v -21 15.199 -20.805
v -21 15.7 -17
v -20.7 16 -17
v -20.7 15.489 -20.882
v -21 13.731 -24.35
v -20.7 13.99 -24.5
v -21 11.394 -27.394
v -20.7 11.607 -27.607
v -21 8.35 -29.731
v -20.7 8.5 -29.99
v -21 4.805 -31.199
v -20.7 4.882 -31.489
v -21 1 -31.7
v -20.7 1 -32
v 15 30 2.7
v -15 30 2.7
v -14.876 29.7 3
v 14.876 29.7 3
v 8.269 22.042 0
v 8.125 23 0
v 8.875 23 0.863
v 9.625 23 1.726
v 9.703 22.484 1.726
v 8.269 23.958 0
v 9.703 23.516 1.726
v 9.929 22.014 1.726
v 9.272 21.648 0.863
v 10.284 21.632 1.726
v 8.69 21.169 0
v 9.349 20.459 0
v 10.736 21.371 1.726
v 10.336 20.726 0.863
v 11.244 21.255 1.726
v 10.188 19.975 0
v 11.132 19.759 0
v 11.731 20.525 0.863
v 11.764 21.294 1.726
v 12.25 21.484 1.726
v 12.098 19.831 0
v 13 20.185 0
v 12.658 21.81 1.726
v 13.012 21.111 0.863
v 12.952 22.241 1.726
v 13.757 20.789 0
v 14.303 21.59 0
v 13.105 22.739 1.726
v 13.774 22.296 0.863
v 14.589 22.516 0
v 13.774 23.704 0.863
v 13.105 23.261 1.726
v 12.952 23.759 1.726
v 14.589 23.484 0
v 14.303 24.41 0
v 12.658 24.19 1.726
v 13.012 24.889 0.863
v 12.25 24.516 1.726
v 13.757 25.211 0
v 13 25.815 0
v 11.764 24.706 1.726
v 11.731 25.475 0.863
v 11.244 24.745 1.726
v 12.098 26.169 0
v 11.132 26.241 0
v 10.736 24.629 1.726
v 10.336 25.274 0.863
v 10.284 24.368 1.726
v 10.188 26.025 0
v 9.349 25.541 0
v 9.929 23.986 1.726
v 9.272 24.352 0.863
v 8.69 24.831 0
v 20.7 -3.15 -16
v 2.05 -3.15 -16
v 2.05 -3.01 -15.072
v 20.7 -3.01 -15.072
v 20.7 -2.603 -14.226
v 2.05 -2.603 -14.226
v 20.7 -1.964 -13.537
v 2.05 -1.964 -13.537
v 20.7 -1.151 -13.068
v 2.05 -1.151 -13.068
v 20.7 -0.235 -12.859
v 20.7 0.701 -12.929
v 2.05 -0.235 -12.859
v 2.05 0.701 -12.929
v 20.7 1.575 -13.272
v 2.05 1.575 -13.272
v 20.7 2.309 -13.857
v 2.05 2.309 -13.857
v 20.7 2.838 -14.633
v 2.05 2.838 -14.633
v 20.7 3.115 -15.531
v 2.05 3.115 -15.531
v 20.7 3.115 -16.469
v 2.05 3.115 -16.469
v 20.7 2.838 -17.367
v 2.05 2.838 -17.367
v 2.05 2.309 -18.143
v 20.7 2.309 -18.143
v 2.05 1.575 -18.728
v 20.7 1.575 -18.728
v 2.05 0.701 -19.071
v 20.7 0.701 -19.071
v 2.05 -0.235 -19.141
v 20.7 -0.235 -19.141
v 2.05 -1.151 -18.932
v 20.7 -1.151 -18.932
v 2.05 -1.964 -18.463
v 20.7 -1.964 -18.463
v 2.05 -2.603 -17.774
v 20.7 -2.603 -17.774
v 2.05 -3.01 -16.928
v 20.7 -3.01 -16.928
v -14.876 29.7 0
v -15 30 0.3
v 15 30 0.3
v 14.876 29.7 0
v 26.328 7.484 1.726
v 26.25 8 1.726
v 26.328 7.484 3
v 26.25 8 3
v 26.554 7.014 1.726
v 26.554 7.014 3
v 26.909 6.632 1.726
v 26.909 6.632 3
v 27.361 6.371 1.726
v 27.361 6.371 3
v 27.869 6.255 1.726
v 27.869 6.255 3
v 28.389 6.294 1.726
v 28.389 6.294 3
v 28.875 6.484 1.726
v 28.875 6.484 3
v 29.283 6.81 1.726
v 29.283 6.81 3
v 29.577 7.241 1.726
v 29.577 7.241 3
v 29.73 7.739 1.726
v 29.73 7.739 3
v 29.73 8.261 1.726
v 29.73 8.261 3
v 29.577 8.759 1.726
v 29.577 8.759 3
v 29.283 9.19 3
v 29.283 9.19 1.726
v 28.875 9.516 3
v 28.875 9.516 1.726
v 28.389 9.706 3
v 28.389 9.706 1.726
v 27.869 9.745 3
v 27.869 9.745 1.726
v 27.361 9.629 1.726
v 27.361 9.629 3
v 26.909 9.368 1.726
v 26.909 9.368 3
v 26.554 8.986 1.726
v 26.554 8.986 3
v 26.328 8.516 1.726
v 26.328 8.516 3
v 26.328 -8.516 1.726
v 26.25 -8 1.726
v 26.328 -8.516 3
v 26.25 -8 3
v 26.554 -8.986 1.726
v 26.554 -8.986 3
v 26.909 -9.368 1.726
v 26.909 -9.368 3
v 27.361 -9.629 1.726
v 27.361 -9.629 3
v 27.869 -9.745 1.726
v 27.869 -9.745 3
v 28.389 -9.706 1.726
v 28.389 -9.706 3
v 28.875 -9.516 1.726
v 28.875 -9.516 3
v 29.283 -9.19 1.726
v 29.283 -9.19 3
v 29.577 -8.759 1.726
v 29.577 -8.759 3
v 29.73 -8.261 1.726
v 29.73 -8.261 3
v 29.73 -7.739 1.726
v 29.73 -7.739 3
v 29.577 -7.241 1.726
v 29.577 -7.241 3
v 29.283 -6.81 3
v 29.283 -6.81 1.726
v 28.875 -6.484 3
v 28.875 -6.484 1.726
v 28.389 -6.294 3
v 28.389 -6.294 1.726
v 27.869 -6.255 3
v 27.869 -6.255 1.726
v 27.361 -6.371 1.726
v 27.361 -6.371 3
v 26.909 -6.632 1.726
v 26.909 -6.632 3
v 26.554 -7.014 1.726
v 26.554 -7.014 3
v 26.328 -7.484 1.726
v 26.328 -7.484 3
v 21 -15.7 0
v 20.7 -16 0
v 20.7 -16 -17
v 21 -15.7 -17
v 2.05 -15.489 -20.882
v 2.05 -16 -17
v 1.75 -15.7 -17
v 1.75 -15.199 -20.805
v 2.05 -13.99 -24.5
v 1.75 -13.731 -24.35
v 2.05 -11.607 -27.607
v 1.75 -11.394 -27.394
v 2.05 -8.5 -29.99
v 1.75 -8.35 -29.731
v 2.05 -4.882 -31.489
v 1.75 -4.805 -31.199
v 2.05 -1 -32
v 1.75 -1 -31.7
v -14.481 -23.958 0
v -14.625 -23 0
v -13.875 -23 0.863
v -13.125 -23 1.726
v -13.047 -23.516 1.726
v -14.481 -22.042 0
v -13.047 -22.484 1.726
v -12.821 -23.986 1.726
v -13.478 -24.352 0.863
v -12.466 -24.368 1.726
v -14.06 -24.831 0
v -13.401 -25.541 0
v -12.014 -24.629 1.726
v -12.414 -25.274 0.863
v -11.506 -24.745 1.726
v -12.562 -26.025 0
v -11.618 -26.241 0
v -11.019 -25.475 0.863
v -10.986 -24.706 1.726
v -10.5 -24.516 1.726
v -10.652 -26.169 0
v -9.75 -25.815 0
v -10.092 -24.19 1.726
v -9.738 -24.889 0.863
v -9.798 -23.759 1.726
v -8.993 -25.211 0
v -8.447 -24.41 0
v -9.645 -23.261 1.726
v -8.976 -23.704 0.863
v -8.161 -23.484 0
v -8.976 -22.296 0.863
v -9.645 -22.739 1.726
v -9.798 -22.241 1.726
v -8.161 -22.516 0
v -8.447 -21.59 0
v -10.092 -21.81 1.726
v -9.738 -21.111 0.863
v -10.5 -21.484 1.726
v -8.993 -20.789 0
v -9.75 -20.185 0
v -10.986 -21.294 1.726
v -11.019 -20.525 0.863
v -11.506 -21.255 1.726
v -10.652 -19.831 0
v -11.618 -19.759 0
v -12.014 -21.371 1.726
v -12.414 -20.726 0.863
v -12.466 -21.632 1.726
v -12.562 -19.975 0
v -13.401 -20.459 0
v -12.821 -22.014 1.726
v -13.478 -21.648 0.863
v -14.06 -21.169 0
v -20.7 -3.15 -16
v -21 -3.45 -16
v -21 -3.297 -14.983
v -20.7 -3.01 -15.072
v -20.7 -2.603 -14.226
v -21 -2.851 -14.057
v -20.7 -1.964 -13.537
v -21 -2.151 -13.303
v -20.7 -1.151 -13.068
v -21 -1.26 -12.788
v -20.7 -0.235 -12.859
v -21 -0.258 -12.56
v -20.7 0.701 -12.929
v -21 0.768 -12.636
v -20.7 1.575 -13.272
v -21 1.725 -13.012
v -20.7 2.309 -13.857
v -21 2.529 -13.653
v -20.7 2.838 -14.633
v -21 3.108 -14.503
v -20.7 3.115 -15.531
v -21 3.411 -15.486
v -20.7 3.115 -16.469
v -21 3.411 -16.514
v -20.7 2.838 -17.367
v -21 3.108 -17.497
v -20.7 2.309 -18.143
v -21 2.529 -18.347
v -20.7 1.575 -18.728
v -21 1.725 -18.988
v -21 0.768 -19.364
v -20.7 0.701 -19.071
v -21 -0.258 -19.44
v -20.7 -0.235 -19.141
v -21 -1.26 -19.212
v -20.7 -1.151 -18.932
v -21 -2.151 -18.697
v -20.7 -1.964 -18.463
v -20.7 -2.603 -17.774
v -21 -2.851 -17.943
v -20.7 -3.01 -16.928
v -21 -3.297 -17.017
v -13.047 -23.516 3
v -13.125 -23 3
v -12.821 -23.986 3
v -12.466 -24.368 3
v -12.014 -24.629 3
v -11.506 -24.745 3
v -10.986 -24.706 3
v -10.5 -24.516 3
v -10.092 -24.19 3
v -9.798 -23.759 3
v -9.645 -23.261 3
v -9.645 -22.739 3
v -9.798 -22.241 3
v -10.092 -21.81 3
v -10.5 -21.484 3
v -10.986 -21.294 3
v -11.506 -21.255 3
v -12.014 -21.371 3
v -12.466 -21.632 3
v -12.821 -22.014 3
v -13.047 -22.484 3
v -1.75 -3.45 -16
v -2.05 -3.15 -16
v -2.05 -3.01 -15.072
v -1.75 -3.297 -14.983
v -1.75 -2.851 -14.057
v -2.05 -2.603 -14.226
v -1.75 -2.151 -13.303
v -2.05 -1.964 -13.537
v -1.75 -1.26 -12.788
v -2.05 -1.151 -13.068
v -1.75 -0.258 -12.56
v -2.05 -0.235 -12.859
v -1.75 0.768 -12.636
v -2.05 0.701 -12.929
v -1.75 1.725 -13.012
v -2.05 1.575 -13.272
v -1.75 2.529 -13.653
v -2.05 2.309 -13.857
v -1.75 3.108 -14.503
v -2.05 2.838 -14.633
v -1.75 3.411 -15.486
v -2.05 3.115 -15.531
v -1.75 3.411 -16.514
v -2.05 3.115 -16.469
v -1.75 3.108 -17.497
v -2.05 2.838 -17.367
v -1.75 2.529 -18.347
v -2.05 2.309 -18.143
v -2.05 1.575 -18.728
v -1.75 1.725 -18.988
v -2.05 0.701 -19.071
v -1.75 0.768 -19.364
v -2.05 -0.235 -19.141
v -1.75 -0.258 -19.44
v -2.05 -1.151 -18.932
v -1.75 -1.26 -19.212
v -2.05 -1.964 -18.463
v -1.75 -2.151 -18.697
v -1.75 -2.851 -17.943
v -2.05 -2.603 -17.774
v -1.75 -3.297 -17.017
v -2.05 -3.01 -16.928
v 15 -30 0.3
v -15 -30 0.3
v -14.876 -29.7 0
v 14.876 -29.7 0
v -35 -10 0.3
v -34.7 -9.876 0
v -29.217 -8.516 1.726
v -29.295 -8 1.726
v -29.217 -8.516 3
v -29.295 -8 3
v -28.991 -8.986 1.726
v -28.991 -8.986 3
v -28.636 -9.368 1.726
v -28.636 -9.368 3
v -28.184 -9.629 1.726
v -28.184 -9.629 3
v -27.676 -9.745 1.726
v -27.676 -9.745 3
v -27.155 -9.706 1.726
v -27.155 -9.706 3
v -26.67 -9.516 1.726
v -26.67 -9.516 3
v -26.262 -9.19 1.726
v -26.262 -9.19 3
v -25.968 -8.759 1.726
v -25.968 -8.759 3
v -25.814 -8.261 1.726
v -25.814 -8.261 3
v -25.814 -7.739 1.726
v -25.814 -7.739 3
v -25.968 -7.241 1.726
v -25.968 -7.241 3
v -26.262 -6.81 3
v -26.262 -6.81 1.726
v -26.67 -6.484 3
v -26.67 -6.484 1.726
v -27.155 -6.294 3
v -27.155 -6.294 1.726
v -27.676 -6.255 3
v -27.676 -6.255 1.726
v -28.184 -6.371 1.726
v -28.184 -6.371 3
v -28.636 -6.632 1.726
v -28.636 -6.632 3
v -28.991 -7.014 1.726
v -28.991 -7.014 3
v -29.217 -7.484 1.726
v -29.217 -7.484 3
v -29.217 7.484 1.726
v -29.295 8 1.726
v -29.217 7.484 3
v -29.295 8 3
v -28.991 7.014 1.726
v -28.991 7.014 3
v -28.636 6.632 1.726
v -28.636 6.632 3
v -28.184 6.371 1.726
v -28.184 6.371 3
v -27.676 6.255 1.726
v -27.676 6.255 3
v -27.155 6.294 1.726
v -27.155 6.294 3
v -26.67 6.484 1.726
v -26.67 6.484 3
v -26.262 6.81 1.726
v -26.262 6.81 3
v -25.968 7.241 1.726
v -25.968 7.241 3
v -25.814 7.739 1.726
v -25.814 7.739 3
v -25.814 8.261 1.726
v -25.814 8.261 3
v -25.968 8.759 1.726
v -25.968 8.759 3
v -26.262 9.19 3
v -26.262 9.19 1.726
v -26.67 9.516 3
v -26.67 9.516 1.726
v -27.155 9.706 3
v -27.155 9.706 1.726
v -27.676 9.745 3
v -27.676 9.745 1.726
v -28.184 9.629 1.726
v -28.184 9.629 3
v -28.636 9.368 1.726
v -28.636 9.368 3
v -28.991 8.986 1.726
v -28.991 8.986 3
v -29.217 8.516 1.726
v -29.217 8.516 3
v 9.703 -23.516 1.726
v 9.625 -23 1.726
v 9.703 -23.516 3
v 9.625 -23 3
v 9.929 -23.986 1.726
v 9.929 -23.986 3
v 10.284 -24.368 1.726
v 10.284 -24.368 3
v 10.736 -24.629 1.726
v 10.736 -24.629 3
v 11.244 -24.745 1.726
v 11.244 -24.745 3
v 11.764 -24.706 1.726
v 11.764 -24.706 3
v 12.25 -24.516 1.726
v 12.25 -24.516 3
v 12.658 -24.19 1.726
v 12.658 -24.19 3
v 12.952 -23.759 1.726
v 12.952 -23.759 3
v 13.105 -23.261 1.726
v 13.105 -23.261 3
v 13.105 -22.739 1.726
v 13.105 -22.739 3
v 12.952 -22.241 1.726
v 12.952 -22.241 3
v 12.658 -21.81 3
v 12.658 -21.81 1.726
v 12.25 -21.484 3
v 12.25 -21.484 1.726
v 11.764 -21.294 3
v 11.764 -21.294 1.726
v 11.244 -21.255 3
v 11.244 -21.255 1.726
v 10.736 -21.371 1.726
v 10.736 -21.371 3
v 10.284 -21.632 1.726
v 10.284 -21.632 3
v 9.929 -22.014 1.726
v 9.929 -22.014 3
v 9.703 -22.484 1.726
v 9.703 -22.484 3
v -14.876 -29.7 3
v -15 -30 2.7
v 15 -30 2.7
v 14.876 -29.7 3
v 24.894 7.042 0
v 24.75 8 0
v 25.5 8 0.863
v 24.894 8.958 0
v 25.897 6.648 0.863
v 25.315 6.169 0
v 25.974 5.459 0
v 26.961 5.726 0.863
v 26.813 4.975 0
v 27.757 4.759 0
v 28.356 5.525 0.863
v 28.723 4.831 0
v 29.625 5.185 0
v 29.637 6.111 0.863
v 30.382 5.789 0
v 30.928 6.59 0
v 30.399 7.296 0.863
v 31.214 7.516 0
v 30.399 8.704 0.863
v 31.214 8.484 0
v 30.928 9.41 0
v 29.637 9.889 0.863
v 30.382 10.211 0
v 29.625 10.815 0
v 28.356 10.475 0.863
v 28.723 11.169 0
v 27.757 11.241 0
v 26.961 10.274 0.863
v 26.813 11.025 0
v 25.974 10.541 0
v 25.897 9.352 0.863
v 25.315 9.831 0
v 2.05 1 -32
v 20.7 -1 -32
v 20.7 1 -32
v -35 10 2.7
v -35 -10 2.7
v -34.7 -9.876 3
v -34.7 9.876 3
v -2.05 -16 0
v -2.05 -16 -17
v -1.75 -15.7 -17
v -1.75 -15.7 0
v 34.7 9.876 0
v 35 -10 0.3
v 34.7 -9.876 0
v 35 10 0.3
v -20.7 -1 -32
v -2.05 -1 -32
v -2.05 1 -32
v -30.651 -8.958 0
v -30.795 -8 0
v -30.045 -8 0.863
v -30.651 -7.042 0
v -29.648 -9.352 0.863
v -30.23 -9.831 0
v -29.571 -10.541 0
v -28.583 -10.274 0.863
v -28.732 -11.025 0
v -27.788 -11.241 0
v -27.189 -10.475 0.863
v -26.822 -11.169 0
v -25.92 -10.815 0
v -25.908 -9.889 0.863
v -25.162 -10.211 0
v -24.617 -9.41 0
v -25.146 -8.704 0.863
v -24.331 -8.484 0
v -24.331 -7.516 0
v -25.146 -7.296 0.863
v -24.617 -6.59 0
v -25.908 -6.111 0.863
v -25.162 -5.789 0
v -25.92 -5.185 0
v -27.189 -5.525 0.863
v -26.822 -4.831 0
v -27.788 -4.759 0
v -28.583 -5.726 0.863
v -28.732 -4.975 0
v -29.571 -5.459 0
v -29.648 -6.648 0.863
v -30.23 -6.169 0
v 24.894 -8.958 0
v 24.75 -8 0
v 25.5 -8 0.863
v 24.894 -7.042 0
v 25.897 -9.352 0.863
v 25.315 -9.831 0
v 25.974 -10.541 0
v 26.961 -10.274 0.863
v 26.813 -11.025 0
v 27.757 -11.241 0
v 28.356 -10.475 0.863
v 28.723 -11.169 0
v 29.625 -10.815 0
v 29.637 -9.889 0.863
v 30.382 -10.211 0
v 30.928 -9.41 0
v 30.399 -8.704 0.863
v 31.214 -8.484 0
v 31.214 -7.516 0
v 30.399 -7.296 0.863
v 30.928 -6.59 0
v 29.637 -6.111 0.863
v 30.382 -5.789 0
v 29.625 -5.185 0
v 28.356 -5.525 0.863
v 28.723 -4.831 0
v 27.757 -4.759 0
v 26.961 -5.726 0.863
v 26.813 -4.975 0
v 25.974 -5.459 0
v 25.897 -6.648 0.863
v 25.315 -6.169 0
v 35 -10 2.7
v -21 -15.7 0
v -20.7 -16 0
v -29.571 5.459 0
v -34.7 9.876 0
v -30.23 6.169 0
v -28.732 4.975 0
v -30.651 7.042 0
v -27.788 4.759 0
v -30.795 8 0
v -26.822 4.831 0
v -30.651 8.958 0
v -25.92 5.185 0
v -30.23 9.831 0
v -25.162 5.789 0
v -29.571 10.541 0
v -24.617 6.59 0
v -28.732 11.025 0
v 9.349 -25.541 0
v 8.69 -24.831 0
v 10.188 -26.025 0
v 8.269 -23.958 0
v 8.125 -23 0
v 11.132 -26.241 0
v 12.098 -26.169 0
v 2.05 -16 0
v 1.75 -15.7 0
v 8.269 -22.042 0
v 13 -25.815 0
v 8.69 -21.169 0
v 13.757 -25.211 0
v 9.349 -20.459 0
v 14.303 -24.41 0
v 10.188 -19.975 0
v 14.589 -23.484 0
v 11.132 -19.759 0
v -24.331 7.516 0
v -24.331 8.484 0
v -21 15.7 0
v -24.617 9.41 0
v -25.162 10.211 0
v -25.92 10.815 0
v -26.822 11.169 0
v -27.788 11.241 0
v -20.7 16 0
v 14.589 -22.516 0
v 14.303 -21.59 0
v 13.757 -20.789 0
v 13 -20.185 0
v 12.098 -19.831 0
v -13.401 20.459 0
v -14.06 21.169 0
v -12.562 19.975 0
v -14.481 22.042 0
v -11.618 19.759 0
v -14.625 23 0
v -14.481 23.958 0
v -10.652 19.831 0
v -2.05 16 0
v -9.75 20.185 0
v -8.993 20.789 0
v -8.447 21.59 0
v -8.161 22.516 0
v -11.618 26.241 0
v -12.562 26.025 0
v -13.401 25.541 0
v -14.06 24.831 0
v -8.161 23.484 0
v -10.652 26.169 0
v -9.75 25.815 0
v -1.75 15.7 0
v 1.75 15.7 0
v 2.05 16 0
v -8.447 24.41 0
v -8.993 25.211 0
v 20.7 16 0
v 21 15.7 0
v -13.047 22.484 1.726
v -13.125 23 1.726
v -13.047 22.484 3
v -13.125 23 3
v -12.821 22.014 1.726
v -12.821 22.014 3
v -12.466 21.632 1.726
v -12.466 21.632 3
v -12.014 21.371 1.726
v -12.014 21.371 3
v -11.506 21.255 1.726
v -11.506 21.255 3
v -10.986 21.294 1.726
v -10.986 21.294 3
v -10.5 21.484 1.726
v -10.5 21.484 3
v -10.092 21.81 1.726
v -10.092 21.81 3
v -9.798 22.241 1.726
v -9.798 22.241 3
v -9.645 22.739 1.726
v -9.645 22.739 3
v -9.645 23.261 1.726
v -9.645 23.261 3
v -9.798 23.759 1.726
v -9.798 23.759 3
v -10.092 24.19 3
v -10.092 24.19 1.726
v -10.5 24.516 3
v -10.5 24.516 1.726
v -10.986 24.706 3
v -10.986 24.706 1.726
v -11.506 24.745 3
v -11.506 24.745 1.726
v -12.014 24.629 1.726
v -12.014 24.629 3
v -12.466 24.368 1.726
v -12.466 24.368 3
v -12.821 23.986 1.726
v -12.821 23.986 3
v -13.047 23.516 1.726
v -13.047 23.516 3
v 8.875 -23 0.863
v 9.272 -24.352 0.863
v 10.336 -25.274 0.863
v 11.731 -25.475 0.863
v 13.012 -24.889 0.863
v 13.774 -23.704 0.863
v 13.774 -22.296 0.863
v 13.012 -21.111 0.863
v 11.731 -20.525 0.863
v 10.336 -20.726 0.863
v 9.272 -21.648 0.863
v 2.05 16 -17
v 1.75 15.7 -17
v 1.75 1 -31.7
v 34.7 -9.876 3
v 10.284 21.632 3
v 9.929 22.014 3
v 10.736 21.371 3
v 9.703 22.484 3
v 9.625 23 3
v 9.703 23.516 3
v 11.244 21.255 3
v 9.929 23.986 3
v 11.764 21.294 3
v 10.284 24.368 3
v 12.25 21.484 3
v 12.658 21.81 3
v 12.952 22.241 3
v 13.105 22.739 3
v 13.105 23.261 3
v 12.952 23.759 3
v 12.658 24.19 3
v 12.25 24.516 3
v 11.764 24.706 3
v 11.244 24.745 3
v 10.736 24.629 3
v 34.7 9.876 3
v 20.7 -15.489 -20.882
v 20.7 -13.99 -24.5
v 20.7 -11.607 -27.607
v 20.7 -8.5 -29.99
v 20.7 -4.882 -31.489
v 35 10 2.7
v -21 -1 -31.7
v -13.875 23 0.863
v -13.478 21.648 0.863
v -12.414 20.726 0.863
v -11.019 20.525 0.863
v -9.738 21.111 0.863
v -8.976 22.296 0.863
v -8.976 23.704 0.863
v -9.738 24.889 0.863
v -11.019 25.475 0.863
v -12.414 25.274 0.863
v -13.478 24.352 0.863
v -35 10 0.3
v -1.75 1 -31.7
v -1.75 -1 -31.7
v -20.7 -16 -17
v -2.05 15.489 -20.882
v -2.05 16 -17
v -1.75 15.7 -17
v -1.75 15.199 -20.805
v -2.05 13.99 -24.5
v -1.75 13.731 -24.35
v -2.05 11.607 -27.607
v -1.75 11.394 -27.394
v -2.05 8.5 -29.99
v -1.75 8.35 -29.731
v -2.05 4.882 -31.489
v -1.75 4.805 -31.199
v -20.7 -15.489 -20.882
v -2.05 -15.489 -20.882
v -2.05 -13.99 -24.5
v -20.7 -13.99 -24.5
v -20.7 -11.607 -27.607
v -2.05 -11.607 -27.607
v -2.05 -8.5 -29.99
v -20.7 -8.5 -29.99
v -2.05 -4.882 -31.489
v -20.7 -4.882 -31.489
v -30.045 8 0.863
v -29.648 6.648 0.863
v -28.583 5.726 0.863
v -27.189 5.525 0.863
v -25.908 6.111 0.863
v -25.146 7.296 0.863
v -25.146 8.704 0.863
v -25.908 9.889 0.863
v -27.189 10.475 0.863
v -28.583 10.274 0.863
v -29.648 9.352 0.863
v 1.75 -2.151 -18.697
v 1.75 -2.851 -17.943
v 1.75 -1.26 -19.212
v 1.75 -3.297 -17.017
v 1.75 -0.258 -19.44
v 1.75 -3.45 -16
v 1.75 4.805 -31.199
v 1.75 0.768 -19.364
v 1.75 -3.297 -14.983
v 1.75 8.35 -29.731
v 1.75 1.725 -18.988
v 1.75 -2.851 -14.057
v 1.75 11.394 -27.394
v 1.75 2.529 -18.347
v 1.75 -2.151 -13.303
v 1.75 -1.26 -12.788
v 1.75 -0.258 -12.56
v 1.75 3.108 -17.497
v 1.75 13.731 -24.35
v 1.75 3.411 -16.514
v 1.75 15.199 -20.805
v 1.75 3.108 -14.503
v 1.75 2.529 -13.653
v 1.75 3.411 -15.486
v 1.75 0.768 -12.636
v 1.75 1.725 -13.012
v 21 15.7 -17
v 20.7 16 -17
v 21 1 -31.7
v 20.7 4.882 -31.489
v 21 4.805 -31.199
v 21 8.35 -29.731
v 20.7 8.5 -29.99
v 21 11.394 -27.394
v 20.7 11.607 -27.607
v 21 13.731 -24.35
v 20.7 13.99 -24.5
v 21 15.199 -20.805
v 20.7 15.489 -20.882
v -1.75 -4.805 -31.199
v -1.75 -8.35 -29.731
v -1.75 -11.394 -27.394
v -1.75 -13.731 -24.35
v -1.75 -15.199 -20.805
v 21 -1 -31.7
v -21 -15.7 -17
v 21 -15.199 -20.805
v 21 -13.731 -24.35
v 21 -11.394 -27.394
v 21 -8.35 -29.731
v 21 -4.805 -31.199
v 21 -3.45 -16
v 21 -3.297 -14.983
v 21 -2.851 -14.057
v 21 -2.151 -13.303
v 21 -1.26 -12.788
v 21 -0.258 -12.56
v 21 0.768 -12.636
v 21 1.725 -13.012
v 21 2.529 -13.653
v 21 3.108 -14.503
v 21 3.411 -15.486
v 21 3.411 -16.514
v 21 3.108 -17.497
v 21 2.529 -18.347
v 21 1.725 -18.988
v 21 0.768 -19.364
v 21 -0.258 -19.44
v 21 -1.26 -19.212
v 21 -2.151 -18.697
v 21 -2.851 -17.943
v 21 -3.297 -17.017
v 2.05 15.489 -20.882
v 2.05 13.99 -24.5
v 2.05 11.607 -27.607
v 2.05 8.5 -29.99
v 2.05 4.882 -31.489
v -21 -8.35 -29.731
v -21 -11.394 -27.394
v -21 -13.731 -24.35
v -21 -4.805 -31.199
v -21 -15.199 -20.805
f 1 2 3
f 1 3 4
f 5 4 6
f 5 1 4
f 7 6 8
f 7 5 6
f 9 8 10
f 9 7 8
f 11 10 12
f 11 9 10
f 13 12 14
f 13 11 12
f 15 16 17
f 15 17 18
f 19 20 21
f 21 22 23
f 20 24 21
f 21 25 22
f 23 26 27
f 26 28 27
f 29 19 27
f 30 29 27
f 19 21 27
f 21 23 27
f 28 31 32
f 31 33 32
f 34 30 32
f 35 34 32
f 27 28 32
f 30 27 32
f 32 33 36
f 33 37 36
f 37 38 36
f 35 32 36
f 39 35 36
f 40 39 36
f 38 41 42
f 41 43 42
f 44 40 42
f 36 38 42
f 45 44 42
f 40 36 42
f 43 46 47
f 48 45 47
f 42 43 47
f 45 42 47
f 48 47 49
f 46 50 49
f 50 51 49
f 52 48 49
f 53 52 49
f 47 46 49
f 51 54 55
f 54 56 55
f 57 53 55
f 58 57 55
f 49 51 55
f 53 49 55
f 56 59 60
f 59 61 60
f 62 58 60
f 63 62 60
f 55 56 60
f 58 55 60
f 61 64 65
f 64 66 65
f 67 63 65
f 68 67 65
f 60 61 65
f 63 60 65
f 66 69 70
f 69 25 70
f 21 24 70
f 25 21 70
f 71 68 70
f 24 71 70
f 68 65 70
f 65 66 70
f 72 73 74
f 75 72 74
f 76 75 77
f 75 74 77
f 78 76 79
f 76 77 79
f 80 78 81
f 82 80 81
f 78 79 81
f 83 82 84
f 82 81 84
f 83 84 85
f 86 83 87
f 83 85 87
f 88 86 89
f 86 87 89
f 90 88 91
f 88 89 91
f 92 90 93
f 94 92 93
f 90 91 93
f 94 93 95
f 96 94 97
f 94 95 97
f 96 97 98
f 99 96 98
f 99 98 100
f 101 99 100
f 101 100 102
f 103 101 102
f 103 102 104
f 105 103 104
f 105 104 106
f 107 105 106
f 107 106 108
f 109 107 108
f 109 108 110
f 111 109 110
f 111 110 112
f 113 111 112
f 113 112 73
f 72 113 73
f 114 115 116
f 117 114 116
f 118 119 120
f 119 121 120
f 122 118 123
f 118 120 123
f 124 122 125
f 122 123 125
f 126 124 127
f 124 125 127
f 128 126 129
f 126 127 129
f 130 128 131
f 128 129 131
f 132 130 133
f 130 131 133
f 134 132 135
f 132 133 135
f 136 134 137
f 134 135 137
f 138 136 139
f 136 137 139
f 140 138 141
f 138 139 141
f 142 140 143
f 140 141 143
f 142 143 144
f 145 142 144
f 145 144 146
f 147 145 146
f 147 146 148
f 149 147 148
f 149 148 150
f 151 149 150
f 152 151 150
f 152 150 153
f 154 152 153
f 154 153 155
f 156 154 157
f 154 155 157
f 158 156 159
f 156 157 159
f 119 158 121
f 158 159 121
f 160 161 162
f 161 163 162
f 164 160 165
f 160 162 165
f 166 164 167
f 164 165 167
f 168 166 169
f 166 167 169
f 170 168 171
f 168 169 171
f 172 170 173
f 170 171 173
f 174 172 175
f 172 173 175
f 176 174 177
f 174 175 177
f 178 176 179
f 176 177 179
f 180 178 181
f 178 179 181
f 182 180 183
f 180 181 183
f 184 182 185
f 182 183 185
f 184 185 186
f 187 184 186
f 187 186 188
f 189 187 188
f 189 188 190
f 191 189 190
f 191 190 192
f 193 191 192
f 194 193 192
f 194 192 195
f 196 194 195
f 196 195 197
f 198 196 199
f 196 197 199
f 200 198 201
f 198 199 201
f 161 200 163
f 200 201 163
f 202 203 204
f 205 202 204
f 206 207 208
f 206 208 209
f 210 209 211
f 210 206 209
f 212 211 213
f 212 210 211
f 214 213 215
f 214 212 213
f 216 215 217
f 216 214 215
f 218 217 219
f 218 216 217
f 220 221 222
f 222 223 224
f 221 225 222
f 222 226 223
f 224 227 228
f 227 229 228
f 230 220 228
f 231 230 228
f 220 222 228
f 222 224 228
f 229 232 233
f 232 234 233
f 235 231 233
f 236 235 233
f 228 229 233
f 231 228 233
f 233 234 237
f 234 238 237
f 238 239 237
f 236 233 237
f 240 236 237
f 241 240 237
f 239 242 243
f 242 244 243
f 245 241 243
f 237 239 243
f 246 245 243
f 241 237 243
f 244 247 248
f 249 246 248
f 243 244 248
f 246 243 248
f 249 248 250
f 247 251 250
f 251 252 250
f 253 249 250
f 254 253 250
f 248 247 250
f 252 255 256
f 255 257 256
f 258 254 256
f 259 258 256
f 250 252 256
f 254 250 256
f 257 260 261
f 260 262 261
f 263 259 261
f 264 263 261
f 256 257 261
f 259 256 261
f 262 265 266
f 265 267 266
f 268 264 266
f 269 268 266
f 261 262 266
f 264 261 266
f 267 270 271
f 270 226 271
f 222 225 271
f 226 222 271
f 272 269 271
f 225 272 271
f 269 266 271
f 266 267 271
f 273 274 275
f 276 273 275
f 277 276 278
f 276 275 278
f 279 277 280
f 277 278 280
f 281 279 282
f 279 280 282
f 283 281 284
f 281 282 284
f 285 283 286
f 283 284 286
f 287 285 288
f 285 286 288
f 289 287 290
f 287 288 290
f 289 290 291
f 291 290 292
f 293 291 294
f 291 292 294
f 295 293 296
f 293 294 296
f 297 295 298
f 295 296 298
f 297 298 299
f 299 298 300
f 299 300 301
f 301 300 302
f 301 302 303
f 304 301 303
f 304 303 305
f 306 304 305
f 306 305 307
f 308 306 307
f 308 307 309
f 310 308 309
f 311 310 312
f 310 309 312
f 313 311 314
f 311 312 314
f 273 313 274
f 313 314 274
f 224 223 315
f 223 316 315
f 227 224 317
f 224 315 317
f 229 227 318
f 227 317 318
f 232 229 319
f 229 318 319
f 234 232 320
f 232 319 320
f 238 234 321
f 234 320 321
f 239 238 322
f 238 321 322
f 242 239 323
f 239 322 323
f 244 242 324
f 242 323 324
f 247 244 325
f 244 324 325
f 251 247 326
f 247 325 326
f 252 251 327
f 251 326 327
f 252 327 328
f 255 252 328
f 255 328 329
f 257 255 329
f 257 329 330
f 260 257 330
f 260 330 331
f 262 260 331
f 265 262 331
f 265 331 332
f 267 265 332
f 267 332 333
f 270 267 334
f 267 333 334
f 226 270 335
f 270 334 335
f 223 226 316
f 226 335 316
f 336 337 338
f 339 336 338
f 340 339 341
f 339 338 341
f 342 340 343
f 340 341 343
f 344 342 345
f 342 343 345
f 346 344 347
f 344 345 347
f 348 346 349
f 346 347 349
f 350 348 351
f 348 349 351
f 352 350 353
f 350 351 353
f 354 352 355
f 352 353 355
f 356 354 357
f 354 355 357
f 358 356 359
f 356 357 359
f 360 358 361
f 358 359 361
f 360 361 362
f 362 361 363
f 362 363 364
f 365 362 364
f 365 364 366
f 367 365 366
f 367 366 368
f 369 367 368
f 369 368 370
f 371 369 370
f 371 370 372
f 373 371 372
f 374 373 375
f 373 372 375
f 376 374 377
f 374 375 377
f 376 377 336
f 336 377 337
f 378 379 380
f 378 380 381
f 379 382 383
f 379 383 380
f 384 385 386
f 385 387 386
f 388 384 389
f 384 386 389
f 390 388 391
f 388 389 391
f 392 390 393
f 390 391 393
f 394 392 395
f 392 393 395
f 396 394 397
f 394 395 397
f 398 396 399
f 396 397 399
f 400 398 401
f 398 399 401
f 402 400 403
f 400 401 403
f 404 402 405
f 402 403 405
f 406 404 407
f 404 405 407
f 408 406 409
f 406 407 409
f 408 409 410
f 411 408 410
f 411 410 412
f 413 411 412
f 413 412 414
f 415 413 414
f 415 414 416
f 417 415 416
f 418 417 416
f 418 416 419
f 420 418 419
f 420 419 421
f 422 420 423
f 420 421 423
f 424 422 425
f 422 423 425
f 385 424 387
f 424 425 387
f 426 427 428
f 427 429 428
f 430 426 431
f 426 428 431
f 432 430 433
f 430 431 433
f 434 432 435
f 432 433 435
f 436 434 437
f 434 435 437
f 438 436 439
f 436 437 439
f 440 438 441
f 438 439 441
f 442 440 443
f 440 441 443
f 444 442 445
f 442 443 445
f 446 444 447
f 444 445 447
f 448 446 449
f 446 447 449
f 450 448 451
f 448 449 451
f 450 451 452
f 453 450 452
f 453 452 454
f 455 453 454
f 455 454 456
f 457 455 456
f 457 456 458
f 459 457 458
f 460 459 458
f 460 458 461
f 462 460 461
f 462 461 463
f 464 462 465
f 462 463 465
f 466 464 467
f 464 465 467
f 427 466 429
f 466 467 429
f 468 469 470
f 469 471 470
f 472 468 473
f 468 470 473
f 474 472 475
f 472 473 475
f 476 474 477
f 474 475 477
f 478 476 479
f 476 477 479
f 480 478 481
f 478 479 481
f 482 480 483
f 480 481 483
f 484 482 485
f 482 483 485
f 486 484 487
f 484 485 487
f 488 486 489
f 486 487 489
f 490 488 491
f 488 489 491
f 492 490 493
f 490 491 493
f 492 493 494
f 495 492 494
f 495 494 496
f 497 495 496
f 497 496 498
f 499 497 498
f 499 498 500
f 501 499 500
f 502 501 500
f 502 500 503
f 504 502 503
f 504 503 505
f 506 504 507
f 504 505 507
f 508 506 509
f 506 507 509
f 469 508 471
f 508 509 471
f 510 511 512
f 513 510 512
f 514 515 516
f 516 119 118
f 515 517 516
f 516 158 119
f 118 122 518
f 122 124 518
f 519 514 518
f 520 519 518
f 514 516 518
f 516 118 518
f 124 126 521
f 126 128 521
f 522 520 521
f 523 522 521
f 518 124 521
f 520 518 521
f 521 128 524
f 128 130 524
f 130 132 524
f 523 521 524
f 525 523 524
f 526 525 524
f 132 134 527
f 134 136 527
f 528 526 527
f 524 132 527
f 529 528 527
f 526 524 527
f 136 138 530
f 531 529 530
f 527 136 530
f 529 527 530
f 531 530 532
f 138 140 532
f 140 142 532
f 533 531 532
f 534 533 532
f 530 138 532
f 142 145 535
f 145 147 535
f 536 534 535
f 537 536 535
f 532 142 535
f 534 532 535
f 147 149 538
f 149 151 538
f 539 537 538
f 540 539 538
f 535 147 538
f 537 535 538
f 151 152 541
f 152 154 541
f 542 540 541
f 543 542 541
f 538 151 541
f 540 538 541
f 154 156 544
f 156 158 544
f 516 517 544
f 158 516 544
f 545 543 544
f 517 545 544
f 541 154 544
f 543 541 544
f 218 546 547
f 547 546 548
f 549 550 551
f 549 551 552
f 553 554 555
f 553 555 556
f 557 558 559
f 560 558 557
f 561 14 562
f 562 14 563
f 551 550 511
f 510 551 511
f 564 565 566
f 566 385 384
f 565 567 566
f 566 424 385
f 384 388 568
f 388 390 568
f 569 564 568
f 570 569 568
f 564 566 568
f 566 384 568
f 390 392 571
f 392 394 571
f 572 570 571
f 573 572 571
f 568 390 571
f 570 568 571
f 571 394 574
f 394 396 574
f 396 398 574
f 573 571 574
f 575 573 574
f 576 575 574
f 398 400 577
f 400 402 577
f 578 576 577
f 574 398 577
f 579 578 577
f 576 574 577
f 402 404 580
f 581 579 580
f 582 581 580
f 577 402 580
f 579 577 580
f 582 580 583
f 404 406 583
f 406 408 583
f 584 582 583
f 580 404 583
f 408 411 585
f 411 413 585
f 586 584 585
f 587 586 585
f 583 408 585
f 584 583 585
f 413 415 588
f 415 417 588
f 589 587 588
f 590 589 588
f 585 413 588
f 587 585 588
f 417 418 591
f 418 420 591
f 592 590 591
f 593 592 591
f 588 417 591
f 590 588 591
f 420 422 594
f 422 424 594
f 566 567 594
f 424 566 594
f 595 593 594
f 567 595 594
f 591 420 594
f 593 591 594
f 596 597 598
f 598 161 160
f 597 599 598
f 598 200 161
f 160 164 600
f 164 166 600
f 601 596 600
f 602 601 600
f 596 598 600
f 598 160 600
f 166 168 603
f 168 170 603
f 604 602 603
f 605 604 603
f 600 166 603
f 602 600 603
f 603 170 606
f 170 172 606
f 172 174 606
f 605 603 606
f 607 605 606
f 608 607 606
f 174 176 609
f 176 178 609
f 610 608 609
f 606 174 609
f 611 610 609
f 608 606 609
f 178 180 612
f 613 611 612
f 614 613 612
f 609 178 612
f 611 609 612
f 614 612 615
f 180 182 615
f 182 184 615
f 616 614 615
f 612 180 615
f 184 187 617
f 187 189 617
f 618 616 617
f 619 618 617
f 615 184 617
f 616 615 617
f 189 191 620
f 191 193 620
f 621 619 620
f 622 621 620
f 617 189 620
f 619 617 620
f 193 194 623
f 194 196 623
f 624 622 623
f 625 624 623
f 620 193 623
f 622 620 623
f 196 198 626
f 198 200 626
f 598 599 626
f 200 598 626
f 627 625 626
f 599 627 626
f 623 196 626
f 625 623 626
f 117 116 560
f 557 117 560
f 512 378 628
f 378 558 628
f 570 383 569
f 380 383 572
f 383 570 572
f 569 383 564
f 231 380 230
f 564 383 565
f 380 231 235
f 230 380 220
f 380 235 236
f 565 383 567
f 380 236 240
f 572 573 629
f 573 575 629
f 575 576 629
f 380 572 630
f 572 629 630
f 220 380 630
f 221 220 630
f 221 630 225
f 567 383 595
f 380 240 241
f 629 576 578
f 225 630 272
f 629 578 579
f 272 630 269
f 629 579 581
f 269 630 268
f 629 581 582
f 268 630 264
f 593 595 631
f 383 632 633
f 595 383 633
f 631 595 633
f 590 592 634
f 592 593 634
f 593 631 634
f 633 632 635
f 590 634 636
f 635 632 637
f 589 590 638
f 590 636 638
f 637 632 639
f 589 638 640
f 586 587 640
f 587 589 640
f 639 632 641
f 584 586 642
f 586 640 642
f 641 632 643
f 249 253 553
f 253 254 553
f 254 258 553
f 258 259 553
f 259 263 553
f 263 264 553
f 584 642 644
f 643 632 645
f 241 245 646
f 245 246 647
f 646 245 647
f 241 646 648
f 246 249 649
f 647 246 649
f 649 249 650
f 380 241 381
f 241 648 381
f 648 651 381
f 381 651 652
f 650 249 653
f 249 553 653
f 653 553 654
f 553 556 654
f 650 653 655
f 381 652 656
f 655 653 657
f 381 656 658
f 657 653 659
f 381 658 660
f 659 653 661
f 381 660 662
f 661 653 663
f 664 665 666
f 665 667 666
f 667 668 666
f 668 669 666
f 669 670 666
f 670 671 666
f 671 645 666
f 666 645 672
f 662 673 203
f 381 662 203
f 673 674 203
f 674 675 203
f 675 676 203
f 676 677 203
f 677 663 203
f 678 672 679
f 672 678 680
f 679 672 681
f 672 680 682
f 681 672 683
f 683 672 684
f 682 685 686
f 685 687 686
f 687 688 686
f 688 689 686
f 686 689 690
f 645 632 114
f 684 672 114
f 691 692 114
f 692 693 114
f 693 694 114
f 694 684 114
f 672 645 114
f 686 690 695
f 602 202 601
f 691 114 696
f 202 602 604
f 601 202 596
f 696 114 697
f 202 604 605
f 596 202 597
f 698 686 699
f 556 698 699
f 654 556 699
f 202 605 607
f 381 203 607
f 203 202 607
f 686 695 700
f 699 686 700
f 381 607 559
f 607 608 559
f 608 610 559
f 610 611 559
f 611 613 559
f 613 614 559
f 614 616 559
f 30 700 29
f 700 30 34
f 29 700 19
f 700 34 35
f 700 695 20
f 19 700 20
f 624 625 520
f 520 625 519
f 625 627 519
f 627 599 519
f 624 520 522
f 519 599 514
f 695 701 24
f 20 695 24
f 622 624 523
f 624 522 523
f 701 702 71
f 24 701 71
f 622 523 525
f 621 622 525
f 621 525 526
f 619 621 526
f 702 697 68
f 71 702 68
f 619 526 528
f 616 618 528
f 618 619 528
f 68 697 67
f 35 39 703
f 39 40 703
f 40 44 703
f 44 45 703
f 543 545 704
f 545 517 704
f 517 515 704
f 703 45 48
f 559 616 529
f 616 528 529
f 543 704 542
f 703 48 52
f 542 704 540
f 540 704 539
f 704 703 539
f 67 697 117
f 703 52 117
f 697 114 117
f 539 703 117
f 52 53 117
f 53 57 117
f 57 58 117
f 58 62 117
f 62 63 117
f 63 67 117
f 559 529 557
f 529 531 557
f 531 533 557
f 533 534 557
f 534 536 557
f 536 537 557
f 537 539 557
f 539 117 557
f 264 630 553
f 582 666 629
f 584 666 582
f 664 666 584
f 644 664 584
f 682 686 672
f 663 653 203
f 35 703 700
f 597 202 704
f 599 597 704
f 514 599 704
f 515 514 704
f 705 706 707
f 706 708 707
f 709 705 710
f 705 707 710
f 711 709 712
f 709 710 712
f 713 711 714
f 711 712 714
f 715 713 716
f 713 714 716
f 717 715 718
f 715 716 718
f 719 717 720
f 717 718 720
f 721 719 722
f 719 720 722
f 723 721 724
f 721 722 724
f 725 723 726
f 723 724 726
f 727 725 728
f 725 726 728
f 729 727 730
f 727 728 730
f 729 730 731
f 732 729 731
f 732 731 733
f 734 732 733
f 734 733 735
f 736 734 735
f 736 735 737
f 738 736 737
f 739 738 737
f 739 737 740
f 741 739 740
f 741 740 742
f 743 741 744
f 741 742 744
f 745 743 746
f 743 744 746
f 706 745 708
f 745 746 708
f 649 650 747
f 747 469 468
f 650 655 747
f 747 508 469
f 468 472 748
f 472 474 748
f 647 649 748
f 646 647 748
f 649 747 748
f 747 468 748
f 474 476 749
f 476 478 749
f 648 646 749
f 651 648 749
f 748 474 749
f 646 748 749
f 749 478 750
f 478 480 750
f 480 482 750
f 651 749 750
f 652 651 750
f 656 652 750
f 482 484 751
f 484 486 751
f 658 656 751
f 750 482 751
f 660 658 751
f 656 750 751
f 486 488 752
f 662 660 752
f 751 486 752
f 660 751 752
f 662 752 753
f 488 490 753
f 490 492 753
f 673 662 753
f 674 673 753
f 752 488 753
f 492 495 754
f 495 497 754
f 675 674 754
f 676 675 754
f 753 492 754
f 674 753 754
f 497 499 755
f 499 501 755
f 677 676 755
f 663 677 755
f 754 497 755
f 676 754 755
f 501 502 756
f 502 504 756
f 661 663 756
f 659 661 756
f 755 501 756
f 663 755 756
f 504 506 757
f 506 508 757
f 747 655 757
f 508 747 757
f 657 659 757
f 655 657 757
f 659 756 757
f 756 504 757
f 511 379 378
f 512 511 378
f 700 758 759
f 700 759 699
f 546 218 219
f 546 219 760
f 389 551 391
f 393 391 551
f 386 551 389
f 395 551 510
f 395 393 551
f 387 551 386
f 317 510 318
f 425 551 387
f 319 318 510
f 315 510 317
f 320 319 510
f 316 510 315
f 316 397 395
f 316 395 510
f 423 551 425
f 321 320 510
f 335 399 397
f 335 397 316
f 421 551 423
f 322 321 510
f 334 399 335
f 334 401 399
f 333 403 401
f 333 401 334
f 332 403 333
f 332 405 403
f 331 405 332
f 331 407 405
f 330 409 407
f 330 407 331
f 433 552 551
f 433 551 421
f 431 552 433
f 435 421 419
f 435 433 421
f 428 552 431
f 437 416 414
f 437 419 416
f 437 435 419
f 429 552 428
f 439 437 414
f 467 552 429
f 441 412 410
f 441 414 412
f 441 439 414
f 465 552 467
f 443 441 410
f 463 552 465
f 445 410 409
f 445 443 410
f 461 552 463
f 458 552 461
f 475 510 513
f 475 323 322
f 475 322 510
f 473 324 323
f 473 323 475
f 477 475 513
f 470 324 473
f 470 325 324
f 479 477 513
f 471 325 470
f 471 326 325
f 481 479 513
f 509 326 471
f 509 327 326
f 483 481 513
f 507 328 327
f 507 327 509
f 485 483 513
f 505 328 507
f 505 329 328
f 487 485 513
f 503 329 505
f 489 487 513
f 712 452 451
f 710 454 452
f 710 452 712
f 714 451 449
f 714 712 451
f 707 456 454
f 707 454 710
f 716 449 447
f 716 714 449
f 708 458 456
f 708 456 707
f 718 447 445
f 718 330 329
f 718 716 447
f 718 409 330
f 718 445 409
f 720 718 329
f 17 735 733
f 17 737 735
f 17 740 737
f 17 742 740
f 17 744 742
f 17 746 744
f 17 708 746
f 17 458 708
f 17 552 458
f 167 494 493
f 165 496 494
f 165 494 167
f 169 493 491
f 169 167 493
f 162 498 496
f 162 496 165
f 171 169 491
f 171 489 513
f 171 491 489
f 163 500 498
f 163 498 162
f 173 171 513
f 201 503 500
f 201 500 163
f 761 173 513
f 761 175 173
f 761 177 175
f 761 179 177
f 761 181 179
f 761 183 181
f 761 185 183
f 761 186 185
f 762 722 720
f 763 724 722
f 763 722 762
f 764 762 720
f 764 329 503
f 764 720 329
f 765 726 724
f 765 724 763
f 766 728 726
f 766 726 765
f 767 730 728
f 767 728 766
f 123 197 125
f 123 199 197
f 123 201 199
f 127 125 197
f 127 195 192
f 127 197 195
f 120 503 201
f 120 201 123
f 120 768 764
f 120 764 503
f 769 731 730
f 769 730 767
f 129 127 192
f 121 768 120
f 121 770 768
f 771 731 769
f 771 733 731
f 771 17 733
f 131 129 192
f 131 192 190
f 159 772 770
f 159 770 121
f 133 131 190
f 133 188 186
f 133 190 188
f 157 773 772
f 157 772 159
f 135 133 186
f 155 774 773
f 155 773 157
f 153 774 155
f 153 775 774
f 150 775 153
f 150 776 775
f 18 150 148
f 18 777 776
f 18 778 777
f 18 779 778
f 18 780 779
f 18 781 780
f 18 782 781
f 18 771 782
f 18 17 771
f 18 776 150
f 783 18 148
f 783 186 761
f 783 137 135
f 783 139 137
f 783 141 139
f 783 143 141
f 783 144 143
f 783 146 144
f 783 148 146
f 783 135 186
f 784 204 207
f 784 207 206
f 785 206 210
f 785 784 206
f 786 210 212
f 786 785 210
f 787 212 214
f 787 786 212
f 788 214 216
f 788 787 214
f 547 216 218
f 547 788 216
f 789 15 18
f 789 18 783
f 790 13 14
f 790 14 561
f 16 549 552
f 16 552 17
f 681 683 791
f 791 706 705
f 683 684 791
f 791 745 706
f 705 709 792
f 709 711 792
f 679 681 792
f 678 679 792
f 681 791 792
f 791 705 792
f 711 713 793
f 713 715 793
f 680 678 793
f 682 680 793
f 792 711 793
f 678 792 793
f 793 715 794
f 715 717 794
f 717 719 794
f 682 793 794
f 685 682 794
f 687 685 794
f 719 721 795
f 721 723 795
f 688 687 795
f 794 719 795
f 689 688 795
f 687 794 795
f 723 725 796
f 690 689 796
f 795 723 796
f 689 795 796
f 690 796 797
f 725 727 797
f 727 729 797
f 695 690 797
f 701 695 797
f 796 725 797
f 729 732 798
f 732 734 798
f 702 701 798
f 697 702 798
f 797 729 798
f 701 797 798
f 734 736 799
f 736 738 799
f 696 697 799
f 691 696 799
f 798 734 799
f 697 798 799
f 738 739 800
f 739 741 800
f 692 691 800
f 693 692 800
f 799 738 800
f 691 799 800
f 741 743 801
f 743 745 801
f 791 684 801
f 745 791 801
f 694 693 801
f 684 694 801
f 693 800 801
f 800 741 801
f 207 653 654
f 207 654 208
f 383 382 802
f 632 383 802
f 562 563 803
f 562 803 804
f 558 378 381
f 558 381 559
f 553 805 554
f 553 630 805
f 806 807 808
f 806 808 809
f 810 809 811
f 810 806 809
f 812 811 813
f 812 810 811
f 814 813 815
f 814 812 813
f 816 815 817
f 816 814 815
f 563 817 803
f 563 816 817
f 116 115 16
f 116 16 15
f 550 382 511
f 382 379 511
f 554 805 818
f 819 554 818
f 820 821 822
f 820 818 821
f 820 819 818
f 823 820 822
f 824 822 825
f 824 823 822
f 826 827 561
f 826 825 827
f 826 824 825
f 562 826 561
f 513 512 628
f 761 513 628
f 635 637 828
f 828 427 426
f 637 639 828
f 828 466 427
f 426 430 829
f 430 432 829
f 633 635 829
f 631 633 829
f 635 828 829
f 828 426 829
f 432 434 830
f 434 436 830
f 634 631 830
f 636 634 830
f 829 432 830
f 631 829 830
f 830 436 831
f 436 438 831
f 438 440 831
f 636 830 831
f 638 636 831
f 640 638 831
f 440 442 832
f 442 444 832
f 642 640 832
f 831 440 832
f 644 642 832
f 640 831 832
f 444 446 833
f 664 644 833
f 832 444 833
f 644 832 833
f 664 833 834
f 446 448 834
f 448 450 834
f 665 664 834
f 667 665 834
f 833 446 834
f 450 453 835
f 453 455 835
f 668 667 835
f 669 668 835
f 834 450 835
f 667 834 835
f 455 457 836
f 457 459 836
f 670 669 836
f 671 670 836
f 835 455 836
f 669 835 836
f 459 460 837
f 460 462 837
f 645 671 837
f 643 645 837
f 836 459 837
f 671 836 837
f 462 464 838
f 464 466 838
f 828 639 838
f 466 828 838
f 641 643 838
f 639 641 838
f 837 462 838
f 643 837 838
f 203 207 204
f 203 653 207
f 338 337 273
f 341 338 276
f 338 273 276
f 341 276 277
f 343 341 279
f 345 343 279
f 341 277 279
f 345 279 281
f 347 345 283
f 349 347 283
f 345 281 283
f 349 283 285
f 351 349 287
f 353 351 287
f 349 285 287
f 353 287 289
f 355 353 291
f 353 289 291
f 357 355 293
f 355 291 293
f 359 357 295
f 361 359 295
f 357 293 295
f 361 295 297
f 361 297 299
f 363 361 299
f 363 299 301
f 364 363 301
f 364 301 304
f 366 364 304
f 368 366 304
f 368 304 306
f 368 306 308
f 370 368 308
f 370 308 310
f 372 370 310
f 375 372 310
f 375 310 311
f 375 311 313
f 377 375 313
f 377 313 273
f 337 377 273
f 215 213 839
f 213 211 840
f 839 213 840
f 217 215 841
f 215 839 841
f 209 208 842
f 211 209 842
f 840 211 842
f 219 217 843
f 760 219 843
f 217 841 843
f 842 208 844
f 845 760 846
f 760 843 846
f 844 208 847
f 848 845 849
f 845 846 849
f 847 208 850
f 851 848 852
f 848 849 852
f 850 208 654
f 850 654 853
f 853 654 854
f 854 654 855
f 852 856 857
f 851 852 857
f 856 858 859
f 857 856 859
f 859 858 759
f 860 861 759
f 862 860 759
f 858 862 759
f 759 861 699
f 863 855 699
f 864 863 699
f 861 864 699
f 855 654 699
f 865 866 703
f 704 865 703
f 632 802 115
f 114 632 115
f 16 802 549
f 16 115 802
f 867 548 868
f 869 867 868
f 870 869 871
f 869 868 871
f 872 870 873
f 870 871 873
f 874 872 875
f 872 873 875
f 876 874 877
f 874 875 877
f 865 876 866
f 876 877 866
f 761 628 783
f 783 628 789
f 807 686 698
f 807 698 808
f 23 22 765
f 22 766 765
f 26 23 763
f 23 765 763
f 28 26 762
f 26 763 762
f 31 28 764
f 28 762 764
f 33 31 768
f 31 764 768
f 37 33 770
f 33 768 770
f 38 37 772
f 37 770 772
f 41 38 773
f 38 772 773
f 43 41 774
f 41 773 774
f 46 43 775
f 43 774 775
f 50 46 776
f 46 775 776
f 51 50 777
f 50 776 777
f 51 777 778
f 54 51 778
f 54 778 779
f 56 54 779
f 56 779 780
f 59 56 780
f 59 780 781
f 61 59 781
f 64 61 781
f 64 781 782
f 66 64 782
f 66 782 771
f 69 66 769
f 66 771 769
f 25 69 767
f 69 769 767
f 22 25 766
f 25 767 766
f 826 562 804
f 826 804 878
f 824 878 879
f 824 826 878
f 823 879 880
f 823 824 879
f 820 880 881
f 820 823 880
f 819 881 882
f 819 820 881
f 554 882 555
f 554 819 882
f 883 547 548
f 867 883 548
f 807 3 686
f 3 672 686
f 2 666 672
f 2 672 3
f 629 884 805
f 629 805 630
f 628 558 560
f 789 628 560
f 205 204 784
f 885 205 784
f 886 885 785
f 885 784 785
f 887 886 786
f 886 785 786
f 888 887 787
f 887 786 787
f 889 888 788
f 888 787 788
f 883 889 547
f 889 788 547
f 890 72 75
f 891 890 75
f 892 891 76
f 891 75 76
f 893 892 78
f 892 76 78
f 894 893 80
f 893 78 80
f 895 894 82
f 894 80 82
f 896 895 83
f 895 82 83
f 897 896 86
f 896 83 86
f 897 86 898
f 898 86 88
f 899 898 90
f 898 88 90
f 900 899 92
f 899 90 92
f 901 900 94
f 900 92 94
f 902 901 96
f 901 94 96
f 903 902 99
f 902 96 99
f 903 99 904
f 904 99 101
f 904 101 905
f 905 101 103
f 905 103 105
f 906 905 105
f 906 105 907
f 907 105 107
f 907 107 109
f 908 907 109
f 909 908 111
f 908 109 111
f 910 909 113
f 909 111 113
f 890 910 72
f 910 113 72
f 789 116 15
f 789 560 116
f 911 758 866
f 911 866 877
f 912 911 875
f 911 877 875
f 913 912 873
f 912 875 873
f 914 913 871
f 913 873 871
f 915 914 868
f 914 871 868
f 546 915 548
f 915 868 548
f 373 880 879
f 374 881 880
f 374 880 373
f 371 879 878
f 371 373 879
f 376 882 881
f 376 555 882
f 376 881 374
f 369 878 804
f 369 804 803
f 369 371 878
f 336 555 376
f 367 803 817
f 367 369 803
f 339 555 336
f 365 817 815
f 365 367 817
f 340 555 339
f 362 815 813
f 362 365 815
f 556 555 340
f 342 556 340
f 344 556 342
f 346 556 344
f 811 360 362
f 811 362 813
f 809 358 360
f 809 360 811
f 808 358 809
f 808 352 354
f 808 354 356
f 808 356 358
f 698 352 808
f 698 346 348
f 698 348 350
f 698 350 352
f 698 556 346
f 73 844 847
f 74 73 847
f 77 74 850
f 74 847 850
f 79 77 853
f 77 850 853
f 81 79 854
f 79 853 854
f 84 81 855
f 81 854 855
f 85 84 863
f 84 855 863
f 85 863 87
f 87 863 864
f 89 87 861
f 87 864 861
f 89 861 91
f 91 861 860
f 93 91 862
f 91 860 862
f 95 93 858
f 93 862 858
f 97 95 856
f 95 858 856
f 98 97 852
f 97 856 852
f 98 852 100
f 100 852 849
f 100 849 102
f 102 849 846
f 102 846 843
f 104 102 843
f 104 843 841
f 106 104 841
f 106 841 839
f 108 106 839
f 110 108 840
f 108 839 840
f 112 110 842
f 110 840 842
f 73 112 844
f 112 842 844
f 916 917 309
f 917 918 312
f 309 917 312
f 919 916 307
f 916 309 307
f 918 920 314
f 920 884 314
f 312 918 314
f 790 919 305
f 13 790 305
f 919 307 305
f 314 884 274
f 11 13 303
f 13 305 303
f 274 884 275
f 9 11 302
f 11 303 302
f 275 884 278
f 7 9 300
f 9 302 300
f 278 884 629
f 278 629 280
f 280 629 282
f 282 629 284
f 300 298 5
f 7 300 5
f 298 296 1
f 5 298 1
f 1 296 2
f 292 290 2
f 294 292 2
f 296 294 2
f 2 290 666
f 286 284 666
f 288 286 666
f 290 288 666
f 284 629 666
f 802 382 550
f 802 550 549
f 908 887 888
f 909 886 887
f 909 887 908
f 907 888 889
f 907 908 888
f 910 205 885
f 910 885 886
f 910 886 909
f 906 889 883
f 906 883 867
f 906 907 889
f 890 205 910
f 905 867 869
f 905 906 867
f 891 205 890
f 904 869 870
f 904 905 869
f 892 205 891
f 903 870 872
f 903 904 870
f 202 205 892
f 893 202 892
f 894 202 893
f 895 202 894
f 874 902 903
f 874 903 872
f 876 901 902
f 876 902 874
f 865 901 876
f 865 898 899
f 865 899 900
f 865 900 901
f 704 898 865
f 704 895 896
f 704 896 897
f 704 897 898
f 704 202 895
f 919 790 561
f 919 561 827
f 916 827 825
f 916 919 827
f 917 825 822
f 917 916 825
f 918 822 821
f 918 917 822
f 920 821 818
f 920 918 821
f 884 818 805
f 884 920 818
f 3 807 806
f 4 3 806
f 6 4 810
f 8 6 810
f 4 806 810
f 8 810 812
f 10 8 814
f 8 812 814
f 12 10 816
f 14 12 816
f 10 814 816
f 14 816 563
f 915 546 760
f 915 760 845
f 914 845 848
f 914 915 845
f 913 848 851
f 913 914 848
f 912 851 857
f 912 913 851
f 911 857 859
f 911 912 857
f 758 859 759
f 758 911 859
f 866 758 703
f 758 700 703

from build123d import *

# Parameters (mm, degrees)
F0_W           = 70
F0_H           = 60
F0_W_2         = 19.25
F0_H_2         = 32
F1_DEPTH       = 3
F2_DEPTH       = 32
F4_D           = 6.3
F5_R           = 15
F6_SIZE        = 20
F7_D           = 3.5
F7_CSINK_D     = 6.5
F7_CSINK_ANGLE = 82
F8_SIZE        = 0.3


# Not quite as in the source:
# - a feature names something its author has since deleted; it is built from what else it names


with BuildPart() as f1:
    # F0 (on Top) → F1 (new body)
    with BuildSketch(Plane.XY):
        Rectangle(F0_W, F0_H)
        with Locations((-11.375, 0)):
            Rectangle(F0_W_2, F0_H_2, mode=Mode.SUBTRACT)
        with Locations((11.375, 0)):
            Rectangle(F0_W_2, F0_H_2, mode=Mode.SUBTRACT)
        with Locations((11.375, 0)):
            Rectangle(F0_W_2, F0_H_2)
        with Locations((-11.375, 0)):
            Rectangle(F0_W_2, F0_H_2)
    extrude(amount=F1_DEPTH)

    # F0 (on Top) → F2 (join)
    with BuildSketch(Plane.XY):
        with Locations((-11.375, 0)):
            Rectangle(F0_W_2, F0_H_2)
        with Locations((11.375, 0)):
            Rectangle(F0_W_2, F0_H_2)
    extrude(amount=-F2_DEPTH)

    # F4 (through all)
    with Locations(Plane.YZ.offset(21)):
        with Locations((0, -16)):
            Hole(F4_D / 2)

    # F5
    f5_edges = [f1.edges().sort_by_distance(p)[0] for p in [
        (11.375, 16, -32),
        (11.375, -16, -32),
        (-11.375, -16, -32),
        (-11.375, 16, -32),
    ]]
    fillet(f5_edges, radius=F5_R)

    # F6
    f6_edges = [f1.edges().sort_by_distance(p)[0] for p in [
        (-35, 30, 1.5),
        (-35, -30, 1.5),
        (35, -30, 1.5),
        (35, 30, 1.5),
    ]]
    chamfer(f6_edges, length=F6_SIZE)

    # F7 (through all)
    with Locations(Plane(origin=(0, 0, 0), x_dir=(1, 0, 0), z_dir=(0, 0, -1))):
        with Locations((-11.375, -23), (11.375, -23), (28, -8), (28, 8), (11.375, 23), (-11.375, 23), (-27.5449063629, 8), (-27.5449063629, -8)):
            CounterSinkHole(F7_D / 2, F7_CSINK_D / 2, counter_sink_angle=F7_CSINK_ANGLE)

    # F8
    f8_edges = [f1.edges().sort_by_distance(p)[0] for p in [
        (1.75, -16, -8.5),
        (21, -16, -8.5),
        (0, -30, 0),
        (35, 0, 0),
        (0, -30, 3),
        (35, 0, 3),
        (0, 30, 3),
        (0, 30, 0),
        (-35, 0, 3),
        (-35, 0, 0),
        (-25, -20, 0),
        (-25, -20, 3),
        (-25, 20, 0),
        (-25, 20, 3),
        (25, 20, 3),
        (25, 20, 0),
        (25, -20, 3),
        (25, -20, 0),
        (-21, 16, -8.5),
        (-21, 11.606602, -27.606602),
        (-21, 0, -32),
        (-21, -16, -8.5),
        (-21, -11.606602, -27.606602),
        (-21, -3.15, -16),
        (-1.75, 16, -8.5),
        (-1.75, -16, -8.5),
        (-1.75, -11.606602, -27.606602),
        (-1.75, 0, -32),
        (-1.75, 11.606602, -27.606602),
        (-1.75, -3.15, -16),
        (1.75, 16, -8.5),
        (1.75, 11.606602, -27.606602),
        (1.75, 0, -32),
        (1.75, -11.606602, -27.606602),
        (1.75, -3.15, -16),
        (21, -11.606602, -27.606602),
        (21, 0, -32),
        (21, 16, -8.5),
        (21, 11.606602, -27.606602),
        (21, -3.15, -16),
    ]]
    chamfer(f8_edges, length=F8_SIZE)


solid = f1.part
